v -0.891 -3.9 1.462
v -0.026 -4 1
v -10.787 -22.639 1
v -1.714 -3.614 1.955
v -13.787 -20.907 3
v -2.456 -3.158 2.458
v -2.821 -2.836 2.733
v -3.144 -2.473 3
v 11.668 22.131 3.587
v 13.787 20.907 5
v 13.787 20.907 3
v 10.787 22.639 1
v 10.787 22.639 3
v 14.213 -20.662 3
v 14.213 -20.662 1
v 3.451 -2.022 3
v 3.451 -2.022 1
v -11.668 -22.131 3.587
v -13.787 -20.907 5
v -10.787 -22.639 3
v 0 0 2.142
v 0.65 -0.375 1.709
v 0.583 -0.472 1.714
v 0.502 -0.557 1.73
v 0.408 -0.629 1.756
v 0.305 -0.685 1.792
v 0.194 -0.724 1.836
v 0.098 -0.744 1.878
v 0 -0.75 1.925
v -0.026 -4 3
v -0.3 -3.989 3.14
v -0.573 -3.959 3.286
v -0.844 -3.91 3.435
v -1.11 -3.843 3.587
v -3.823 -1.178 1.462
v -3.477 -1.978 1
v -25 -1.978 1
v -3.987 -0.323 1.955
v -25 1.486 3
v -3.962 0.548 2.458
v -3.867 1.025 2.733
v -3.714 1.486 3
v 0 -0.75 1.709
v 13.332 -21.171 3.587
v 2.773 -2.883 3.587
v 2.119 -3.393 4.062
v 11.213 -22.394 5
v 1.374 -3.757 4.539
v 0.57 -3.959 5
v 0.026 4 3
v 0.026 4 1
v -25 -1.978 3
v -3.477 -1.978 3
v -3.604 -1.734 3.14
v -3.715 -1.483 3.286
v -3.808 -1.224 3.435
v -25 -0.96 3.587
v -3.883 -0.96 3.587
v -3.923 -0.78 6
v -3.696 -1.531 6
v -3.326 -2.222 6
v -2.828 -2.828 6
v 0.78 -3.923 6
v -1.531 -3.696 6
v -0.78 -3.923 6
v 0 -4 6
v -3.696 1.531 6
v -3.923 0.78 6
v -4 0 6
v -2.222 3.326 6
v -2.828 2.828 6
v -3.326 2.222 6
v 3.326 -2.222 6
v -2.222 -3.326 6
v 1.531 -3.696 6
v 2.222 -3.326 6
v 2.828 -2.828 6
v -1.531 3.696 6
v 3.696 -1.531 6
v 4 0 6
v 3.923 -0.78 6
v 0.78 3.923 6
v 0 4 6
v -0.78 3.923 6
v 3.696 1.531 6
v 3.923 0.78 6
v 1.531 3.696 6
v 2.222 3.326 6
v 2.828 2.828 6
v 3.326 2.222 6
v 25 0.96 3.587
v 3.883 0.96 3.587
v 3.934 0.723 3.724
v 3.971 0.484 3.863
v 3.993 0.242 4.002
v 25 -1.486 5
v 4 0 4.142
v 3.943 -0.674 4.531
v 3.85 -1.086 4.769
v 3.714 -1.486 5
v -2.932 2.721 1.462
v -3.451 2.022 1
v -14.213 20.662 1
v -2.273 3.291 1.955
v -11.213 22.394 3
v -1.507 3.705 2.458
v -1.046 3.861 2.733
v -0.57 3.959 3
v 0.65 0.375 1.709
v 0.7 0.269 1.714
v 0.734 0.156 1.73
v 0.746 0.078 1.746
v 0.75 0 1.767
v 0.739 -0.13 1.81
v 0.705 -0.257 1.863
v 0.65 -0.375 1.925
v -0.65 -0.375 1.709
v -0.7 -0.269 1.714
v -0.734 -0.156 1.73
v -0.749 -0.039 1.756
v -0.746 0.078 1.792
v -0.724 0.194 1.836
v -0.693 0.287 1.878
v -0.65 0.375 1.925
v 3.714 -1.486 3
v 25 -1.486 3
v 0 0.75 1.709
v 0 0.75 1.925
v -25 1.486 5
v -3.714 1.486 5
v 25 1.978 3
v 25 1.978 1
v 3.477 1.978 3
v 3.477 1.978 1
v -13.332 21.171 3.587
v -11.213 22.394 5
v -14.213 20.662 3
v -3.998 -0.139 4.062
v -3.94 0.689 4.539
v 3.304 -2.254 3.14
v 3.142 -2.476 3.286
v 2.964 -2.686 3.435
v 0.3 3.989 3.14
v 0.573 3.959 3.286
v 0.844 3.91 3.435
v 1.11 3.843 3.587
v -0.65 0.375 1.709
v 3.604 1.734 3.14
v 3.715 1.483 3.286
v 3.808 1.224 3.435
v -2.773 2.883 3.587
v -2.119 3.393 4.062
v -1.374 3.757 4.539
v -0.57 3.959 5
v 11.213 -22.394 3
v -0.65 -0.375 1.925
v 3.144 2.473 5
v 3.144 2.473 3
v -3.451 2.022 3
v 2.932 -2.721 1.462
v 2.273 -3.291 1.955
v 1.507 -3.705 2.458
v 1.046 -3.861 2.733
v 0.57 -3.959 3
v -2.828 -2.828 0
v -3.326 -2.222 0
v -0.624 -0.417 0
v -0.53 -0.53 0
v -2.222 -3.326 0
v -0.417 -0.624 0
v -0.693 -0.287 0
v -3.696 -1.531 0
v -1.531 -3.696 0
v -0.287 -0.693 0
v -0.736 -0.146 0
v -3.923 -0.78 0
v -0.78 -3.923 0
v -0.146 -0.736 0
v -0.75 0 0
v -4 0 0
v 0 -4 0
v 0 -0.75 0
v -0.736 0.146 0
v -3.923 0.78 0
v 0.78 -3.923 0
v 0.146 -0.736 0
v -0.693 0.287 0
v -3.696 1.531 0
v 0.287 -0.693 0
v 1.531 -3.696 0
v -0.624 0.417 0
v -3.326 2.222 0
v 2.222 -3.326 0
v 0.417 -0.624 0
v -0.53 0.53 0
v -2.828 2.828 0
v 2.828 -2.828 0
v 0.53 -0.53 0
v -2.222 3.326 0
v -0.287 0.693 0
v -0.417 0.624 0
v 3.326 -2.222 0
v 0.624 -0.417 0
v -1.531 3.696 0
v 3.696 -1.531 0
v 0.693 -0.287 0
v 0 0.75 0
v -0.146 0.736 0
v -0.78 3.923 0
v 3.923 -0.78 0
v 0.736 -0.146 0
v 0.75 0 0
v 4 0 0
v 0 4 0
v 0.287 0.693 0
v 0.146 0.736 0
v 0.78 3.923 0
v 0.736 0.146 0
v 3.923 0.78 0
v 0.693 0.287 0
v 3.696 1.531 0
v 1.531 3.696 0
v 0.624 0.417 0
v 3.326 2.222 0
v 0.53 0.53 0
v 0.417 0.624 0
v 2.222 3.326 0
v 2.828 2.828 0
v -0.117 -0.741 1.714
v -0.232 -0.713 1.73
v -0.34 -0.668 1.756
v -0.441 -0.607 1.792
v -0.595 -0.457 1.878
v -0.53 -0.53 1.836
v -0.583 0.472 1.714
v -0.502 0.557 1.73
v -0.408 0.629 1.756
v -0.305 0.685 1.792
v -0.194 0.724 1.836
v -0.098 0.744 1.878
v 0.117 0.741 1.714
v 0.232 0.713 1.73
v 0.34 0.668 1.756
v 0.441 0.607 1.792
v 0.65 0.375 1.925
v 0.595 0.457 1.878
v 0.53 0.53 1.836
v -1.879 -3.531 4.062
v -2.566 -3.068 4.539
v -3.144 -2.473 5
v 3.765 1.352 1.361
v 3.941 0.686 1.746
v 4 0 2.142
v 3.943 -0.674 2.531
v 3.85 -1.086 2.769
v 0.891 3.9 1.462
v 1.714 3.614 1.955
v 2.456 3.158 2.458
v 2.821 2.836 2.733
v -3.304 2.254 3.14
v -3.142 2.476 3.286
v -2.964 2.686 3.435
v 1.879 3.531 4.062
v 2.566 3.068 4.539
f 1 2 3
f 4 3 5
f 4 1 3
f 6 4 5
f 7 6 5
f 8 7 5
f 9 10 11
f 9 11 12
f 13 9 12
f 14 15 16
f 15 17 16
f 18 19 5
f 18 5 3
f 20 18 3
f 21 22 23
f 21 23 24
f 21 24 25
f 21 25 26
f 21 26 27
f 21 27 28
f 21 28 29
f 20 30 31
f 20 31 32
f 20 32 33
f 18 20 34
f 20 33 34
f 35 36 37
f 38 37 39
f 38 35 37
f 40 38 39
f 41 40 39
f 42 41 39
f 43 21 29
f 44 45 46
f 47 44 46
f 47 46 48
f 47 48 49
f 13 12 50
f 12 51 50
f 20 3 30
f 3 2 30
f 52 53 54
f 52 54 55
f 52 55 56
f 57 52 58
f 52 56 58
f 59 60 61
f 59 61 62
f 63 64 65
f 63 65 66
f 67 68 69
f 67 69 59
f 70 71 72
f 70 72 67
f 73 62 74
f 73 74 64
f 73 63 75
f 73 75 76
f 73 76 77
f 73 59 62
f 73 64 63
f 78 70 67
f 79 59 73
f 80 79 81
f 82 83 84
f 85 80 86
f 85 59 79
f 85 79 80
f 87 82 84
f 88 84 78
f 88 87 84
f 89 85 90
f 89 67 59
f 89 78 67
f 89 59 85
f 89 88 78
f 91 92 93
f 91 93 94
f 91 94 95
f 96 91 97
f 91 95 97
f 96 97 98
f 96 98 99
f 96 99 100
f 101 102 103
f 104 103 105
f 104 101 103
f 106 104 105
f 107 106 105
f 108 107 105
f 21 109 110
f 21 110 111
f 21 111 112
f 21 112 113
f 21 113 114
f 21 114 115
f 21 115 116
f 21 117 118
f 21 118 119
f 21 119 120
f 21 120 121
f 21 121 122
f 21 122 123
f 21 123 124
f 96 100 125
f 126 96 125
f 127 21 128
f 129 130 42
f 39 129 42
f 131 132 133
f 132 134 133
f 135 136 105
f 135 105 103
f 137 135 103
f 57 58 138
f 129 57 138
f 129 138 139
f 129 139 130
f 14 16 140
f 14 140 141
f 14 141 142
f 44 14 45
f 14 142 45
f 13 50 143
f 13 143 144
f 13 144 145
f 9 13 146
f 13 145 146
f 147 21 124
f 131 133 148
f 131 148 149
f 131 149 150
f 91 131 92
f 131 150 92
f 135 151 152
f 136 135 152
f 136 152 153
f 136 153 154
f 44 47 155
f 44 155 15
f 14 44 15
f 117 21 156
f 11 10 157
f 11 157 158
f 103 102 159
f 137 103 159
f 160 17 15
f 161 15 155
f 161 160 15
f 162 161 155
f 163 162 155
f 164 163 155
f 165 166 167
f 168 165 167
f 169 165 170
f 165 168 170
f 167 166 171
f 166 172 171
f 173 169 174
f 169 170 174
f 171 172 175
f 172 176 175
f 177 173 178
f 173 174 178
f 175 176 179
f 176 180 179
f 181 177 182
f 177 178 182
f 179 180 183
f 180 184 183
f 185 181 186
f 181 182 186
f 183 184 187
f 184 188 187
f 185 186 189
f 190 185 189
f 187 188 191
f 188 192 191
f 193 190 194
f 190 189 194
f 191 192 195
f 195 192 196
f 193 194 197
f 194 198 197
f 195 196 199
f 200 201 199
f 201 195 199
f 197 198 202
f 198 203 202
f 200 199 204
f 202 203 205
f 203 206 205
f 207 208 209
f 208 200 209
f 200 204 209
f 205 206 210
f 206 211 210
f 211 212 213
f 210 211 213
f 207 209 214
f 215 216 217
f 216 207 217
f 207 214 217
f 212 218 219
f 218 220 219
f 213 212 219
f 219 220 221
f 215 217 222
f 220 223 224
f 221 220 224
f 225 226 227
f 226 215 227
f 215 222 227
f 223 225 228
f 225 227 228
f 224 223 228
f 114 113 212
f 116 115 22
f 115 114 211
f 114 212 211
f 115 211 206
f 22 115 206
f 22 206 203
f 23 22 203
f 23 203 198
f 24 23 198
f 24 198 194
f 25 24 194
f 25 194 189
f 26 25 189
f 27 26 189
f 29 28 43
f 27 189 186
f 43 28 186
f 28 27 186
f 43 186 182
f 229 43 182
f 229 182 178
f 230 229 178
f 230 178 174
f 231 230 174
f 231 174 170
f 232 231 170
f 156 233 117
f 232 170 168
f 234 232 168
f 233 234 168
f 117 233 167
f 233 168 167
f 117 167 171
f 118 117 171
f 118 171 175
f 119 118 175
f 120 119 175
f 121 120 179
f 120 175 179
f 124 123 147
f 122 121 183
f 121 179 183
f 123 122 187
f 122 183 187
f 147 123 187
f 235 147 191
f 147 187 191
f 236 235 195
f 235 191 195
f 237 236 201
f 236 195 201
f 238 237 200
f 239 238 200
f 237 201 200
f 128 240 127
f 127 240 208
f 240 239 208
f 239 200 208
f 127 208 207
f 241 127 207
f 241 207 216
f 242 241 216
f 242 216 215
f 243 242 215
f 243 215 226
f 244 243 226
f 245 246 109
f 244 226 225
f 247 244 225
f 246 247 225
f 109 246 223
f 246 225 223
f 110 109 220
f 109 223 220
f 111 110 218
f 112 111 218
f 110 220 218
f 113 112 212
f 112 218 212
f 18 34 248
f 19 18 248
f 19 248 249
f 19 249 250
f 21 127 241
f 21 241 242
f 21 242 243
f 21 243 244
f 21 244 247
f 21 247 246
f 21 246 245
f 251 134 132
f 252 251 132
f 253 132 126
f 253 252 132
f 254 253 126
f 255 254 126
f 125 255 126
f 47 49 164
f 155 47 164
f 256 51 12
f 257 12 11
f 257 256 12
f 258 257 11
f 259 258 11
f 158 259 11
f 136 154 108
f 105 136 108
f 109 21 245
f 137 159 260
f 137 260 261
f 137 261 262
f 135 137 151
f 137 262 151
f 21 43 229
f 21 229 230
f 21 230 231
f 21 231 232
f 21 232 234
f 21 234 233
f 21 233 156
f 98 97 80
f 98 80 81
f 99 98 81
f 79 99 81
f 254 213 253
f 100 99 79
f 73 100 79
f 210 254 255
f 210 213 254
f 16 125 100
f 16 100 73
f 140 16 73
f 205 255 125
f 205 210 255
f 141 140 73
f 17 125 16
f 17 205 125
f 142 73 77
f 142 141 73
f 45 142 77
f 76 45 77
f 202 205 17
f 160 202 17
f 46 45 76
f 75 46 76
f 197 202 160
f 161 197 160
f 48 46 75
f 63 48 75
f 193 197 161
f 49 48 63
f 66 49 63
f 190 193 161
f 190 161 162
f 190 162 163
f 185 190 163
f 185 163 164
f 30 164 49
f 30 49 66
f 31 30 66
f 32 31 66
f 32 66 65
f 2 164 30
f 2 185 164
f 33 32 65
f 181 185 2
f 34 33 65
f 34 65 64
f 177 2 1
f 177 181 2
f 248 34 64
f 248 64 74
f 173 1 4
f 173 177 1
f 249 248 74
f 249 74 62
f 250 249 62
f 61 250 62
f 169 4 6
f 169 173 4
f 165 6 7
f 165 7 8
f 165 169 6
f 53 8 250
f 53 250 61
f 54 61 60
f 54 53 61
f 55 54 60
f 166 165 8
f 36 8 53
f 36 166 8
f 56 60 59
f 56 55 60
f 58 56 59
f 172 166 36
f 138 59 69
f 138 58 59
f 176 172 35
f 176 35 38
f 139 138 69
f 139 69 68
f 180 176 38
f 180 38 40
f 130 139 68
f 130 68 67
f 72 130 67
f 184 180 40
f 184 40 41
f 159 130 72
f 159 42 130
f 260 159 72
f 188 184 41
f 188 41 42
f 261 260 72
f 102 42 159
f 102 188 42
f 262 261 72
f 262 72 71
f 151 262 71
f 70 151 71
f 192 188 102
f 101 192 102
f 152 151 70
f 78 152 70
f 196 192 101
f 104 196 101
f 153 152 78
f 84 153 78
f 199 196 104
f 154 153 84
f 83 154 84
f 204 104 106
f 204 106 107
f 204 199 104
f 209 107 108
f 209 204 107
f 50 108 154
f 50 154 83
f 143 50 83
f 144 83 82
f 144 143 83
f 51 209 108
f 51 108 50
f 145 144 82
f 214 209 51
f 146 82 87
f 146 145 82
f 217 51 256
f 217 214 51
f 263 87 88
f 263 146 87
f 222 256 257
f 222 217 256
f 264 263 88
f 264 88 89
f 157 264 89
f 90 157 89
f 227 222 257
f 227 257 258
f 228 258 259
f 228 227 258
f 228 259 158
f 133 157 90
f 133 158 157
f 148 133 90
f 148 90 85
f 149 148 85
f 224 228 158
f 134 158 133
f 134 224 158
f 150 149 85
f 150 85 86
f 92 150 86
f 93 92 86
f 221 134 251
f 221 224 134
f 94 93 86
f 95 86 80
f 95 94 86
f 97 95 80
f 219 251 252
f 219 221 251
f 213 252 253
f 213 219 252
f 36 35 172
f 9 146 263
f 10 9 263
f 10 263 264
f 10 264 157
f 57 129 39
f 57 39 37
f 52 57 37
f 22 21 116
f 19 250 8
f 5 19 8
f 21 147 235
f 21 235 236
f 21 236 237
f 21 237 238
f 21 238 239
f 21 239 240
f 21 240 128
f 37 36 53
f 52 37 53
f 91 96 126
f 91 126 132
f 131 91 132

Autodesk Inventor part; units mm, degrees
ref_plane "XZ Plane" through (0, 0, 0) normal (0, 1, 0) x (-1, 0, 0)
ref_plane "XY Plane" through (0, 0, 0) normal (0, 0, 1) x (1, 0, 0)
sketch "Sketch1" plane through (0, 0, 0) normal (0, 0, 1) x (1, 0, 0)
  circle A0 centre (0, 0) radius 0.75
  circle A1 centre (0, 0) radius 4
  dimension "d0" = 1.5
  dimension "d1" = 8
extrude "Extrusion1" add sketch "Sketch1" along normal blind 6 contours A0 | A1
extrude "Extrusion2" cut sketch "Sketch1" along normal blind 4 contours A0
ref_plane "Work Plane1" through (0, 0, 0) normal (1, 0, 0) x (0, 1, 0)
sketch "Sketch2" plane through (0, 0, 0) normal (1, 0, 0) x (0, 1, 0)
  line L0 (1.9777, 1) -> (-1.4864, 3)
  line L1 (1.9777, 1) -> (5.9777, 1) construction
  line L2 (1.9777, 1) -> (1.9777, 3)
  line L3 (1.9777, 3) -> (0.9602, 3.5874)
  line L4 (-4, 0) -> (4, 0) projected
  line L5 (0.9602, 3.5874) -> (-1.4864, 5)
  line L6 (-1.4864, 5) -> (-1.4864, 3)
  line L7 (-4, 6) -> (4, 6) projected
  point P0 (0, 0)
  dimension "d7" = 150
  dimension "d8" = 2
  dimension "d9" = 1
  dimension "d10" = 1
extrude "Extrusion3" add sketch "Sketch2" along normal blind 25
sketch "Sketch3" plane through (0, 0, 0) normal (1, 0, 0) x (0, 1, 0)
  point P0 (0, 0)
pattern_circular "Circular Pattern1" count 6 over 360 about axis through (0, 0, 0) along (0, 0, 1) of "Extrusion3"
properties part number "propeler"
